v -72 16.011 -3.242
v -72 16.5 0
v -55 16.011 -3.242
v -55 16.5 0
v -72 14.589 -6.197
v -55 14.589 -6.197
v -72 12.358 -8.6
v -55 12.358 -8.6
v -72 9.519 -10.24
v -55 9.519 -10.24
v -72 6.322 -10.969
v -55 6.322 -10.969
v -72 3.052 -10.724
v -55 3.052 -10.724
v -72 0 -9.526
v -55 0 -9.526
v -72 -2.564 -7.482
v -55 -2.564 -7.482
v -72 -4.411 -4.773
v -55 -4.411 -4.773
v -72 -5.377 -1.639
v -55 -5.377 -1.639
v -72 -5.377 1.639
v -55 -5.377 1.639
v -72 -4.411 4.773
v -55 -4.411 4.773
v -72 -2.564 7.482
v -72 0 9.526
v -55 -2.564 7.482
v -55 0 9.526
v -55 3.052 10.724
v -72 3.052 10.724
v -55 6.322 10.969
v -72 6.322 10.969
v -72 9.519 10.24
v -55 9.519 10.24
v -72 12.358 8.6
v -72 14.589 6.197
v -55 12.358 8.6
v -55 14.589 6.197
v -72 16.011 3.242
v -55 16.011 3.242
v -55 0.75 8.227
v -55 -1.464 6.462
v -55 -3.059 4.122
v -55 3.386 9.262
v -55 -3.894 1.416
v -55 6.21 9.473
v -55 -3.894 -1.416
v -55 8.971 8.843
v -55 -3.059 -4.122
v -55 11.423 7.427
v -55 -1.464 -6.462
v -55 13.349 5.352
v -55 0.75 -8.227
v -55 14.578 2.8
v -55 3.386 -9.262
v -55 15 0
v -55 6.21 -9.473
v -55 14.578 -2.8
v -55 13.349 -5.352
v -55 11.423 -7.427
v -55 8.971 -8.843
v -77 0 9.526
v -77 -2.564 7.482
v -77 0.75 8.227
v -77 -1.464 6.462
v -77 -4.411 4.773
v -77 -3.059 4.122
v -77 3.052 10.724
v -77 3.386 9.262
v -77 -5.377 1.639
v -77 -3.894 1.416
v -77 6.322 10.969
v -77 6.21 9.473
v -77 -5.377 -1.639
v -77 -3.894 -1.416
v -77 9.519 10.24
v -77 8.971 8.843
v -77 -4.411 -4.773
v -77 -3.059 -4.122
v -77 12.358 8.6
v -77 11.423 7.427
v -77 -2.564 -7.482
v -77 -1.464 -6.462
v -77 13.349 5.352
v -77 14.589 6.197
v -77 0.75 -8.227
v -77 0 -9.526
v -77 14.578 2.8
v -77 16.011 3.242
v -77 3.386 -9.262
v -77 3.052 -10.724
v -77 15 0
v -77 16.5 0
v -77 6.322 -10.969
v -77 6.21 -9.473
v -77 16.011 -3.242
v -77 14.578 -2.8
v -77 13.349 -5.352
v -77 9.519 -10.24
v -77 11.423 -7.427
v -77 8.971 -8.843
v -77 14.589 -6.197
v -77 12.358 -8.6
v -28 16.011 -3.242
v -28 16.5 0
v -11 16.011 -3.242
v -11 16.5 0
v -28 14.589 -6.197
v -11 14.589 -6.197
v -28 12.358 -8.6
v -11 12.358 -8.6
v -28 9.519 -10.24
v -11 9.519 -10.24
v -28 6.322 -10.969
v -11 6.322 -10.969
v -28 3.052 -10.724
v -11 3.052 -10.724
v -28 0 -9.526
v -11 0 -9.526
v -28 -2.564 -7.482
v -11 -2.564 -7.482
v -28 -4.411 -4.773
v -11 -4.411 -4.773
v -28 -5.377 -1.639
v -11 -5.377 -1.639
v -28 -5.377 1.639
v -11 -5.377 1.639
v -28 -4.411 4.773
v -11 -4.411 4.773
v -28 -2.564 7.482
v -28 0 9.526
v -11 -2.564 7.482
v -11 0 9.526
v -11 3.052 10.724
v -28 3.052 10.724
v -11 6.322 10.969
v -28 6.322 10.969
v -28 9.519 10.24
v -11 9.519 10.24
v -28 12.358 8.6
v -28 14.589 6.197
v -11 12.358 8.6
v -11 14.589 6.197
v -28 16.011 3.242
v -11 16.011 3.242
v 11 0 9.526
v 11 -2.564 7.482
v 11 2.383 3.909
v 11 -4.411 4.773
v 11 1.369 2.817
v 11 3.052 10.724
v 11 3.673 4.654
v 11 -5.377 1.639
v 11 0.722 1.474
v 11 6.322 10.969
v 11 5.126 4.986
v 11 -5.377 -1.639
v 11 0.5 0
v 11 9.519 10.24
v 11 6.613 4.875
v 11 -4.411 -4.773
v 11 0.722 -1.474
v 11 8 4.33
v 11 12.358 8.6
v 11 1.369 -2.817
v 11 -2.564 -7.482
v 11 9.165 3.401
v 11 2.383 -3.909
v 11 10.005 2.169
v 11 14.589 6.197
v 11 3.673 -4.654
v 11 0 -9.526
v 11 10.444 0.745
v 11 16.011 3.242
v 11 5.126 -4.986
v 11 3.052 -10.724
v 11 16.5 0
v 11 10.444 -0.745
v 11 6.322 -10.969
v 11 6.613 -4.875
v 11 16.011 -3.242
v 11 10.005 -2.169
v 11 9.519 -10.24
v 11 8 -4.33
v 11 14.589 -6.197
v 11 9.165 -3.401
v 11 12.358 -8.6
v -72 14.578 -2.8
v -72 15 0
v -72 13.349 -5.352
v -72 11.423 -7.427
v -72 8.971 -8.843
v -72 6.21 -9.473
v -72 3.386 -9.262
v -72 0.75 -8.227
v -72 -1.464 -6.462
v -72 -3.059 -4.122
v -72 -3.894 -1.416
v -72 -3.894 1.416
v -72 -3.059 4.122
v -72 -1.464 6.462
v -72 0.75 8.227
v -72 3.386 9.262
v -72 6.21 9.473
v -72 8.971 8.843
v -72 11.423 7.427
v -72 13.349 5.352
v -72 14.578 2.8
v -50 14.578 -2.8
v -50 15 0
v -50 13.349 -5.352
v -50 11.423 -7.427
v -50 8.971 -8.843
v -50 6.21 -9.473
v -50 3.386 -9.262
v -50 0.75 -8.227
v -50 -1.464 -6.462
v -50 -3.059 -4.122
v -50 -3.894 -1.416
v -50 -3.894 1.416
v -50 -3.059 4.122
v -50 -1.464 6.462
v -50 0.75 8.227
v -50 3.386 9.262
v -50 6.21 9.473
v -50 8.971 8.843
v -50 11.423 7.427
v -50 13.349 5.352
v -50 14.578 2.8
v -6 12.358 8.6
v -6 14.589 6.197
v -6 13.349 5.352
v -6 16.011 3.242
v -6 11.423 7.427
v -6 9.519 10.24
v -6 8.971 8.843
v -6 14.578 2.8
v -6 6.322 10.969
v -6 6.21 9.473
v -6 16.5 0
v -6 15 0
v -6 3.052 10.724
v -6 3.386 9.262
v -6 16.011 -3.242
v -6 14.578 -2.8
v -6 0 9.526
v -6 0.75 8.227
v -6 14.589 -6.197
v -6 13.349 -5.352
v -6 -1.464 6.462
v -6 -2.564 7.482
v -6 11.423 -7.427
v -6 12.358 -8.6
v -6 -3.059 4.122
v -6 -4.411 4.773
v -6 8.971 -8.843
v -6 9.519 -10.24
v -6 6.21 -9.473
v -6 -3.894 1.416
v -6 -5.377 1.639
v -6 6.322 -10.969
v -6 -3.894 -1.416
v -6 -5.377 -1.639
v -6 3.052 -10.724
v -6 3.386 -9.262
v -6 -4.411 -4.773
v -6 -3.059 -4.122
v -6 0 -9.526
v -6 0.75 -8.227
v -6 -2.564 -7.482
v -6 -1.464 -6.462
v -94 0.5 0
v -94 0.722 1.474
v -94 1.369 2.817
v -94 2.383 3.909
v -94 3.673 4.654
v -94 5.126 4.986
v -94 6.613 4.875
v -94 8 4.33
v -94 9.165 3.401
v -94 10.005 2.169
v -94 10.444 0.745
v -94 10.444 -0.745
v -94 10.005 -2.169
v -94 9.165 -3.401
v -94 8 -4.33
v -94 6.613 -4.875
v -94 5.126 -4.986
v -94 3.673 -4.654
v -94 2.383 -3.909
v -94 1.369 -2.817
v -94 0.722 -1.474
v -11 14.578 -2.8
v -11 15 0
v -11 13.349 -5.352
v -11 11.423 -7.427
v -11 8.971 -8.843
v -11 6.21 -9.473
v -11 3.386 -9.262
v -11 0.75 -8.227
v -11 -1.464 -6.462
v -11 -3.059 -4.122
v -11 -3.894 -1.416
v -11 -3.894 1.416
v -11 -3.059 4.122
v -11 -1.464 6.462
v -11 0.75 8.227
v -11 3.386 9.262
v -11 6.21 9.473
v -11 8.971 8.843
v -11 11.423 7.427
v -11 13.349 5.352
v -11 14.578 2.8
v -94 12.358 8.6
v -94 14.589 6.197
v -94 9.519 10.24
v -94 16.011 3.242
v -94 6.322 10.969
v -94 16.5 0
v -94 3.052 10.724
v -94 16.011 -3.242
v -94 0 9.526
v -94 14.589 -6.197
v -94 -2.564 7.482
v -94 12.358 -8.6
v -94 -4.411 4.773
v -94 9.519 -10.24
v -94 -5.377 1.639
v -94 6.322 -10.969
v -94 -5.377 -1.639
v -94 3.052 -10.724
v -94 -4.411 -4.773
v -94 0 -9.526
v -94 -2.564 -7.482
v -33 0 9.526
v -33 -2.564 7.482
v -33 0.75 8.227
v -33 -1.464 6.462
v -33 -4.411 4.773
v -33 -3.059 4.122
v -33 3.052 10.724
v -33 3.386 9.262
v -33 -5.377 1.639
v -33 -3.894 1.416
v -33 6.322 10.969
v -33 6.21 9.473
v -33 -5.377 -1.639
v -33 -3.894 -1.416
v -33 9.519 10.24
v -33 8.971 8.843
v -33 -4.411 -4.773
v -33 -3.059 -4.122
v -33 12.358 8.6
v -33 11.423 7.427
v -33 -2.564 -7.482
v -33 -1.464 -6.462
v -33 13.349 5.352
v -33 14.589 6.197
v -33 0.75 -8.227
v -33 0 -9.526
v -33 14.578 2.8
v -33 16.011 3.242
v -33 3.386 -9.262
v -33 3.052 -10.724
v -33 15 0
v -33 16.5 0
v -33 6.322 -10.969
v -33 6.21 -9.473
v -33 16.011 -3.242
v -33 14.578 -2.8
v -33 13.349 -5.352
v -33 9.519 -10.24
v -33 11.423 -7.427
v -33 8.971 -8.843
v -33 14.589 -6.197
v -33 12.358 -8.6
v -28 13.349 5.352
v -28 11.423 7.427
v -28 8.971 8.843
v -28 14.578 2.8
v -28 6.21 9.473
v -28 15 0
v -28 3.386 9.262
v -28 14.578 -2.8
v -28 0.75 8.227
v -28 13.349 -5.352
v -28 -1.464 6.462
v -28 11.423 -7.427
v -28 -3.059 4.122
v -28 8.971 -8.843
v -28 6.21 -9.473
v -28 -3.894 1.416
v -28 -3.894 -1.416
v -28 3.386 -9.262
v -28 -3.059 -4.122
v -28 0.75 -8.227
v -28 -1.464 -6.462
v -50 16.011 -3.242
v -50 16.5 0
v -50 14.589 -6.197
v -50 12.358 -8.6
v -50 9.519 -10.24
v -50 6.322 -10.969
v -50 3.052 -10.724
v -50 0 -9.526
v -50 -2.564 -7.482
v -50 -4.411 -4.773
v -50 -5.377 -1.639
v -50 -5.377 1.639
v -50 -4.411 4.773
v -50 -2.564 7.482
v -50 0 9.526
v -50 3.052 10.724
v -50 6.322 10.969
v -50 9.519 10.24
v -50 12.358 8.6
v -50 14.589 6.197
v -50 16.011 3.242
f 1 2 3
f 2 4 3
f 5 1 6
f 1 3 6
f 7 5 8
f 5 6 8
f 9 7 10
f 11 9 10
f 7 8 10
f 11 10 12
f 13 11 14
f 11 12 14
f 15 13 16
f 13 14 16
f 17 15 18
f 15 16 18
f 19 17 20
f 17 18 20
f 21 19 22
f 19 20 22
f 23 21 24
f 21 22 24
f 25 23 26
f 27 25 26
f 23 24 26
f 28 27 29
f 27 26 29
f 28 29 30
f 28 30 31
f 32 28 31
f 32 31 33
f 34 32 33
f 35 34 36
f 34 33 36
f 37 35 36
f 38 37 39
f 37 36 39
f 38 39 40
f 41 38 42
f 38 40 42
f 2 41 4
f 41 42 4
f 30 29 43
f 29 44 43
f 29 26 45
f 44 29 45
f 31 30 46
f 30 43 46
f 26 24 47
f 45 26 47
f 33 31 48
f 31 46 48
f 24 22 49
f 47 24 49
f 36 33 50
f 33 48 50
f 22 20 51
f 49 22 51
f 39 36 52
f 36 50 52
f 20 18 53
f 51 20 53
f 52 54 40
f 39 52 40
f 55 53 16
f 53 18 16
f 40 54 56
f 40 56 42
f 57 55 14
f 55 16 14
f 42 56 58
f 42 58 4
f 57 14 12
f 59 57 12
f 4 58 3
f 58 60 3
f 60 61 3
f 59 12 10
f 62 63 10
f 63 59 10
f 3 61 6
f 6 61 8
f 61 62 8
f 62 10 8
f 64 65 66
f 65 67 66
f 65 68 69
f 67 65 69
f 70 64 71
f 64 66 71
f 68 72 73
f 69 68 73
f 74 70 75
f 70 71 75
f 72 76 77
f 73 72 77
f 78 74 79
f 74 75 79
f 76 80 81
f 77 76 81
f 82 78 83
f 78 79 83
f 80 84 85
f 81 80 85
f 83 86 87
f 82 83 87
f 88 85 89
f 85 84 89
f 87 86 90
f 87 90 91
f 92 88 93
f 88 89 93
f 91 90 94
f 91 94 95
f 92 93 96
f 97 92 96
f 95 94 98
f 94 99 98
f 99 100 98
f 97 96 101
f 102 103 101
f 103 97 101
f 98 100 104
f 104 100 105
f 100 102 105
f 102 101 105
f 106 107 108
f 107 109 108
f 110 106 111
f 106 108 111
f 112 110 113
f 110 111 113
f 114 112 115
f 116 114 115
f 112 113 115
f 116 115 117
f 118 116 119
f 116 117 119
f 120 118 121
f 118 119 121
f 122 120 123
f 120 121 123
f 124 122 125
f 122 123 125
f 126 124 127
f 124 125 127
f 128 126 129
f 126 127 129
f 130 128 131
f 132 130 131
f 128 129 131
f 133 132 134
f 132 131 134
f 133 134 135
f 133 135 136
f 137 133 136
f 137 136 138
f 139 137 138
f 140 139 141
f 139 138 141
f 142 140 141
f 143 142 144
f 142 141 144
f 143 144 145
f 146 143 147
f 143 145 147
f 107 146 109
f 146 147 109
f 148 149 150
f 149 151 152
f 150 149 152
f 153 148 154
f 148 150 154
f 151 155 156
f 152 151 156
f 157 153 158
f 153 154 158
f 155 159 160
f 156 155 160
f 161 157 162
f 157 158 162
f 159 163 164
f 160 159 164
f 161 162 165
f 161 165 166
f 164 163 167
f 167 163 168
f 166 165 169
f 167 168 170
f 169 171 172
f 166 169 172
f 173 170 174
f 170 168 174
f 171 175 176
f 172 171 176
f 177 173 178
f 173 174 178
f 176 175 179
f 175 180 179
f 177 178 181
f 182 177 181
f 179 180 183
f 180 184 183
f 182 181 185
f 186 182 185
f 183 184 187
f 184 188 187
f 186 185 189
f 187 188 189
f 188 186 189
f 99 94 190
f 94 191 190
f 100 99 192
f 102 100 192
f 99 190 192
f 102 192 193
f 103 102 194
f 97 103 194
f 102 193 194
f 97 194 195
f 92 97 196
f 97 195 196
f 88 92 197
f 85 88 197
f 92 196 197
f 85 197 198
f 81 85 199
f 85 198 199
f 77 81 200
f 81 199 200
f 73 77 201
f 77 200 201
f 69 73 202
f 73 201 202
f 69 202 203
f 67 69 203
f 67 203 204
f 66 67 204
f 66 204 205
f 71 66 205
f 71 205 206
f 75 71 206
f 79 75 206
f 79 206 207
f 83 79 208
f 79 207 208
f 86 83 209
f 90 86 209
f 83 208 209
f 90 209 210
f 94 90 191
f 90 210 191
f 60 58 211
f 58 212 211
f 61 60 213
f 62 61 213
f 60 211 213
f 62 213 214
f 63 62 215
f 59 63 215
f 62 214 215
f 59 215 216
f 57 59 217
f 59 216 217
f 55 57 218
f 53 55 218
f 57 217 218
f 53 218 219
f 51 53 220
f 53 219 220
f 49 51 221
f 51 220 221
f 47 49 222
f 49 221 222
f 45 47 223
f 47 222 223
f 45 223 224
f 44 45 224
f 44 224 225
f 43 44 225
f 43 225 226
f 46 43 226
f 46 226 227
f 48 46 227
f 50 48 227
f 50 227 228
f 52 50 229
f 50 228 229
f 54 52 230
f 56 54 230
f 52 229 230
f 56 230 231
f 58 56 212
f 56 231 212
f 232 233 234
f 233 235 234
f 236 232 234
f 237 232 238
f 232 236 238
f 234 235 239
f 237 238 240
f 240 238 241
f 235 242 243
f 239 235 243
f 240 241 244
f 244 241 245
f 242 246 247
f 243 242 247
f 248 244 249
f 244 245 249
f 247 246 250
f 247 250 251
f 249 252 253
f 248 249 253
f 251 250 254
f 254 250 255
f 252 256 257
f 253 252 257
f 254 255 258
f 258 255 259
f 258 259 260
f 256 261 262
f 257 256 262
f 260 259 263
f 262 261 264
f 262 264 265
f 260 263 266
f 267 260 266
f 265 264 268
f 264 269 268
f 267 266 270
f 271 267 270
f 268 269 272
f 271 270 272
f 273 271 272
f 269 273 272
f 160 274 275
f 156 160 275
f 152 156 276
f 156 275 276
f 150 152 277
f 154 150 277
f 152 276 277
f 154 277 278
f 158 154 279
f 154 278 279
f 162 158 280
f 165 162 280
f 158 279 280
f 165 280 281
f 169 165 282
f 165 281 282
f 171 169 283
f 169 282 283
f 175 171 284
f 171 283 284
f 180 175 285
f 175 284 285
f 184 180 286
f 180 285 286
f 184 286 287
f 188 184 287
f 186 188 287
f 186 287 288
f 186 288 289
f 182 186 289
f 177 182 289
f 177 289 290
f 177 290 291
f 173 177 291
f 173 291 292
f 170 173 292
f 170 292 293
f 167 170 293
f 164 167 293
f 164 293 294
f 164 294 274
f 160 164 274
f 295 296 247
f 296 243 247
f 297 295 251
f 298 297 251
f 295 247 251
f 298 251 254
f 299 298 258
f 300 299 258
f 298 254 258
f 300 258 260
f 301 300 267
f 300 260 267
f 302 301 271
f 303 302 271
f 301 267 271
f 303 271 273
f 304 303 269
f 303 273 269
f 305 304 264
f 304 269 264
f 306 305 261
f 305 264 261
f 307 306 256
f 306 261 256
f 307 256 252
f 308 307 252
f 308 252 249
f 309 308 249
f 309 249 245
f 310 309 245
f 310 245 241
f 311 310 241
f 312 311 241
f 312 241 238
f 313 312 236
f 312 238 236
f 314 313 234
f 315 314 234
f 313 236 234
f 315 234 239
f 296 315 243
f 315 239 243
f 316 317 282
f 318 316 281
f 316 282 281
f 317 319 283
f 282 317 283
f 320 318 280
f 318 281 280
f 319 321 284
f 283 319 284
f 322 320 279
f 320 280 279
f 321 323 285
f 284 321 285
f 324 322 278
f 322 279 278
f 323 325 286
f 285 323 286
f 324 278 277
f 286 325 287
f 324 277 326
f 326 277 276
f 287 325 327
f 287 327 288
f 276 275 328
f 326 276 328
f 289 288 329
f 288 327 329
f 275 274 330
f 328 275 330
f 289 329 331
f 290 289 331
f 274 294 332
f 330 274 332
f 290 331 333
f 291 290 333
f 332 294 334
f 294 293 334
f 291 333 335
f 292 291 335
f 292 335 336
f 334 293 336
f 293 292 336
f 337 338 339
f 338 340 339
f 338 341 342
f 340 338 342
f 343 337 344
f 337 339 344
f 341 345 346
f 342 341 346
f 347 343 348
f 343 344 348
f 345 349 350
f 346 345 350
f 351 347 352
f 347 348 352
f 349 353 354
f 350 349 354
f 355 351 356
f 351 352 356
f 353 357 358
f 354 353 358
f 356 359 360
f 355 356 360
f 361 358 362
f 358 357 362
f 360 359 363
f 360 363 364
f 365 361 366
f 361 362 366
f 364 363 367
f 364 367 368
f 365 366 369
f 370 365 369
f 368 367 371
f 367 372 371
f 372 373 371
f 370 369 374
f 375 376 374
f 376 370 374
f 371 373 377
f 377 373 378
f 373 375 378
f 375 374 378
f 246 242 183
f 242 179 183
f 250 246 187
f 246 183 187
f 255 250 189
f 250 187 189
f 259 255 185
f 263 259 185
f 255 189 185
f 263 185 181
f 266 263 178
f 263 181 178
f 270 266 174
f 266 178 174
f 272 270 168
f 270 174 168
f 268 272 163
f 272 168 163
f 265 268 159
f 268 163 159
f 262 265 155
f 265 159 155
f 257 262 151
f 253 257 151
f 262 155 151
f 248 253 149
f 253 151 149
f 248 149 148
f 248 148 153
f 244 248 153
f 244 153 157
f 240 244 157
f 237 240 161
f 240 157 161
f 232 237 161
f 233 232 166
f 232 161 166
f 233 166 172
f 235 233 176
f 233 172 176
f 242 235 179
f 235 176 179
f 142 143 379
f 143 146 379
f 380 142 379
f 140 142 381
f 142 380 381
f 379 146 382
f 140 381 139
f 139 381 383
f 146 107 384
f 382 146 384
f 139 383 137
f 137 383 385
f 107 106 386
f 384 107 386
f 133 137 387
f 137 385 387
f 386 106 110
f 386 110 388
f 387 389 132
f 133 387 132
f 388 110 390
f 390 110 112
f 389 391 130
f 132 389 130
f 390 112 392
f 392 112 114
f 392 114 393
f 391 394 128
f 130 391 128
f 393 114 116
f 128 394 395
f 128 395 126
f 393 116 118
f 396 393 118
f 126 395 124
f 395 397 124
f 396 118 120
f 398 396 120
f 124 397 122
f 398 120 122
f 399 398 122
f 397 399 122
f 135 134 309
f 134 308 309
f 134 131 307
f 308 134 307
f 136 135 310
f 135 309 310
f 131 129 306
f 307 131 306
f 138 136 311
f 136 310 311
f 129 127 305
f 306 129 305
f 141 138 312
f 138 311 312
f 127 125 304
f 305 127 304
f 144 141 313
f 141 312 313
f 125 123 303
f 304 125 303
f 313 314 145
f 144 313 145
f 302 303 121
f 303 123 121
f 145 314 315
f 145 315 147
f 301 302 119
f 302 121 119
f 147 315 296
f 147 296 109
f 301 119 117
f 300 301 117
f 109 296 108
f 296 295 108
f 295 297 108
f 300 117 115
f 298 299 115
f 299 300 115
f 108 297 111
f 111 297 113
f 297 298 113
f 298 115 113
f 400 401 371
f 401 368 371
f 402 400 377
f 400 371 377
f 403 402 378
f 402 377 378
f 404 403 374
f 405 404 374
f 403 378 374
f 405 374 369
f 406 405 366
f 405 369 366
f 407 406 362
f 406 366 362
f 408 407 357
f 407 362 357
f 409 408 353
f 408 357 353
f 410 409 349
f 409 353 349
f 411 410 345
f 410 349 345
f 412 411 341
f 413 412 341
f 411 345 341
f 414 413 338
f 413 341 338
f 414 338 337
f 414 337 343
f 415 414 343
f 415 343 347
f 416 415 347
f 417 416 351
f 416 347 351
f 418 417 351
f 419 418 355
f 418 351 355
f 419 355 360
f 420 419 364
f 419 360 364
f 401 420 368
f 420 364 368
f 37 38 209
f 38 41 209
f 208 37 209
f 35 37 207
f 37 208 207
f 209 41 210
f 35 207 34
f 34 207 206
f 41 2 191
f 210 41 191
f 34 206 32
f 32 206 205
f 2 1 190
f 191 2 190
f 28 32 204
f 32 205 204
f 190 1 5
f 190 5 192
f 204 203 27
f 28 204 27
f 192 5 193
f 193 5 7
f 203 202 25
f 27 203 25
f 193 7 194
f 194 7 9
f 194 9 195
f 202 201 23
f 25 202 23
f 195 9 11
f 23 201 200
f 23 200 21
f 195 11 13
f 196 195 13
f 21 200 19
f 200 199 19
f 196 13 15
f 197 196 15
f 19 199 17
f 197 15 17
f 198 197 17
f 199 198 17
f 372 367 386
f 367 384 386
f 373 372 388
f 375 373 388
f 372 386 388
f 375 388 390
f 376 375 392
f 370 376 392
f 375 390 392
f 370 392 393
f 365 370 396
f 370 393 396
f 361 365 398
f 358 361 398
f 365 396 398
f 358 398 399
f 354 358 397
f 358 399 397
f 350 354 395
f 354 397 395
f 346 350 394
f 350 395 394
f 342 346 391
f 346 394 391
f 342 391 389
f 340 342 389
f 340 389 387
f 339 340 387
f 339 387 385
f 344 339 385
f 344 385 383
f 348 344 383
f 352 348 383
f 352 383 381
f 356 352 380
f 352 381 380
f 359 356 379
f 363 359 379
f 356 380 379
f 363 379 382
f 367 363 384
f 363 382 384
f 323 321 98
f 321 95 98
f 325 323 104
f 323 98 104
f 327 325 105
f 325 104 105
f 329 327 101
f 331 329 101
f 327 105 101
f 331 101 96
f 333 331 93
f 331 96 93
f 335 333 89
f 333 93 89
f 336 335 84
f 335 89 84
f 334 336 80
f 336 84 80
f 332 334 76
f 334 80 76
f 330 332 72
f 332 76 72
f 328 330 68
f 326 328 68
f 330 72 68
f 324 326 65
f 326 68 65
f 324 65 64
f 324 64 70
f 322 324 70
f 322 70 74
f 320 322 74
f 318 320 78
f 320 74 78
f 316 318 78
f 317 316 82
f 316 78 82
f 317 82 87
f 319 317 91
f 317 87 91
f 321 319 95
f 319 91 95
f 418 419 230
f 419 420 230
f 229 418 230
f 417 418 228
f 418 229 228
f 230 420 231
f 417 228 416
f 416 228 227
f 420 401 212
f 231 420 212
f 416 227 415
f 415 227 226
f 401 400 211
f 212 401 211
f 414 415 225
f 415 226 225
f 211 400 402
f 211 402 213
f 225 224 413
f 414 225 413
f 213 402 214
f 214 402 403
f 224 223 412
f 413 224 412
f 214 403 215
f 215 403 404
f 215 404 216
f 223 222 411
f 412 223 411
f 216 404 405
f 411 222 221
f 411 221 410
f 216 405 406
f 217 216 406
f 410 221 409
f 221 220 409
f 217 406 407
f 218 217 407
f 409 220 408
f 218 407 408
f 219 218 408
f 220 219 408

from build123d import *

# Parameters (mm, degrees)
SKETCH3_R          = 5
CUT_EXTRUDE2_DEPTH = 107.856211799


with BuildPart() as part:
    # Sketch1 → Revolve2 (revolve)
    with BuildSketch(Plane.XY, mode=Mode.PRIVATE) as revolve2_sk:
        Polygon((-6, -5.5), (11, -5.5), (11, 5.5), (-6, 5.5), (-11, 5.5), (-33, 5.5), (-55, 5.5), (-77, 5.5), (-94, 5.5), (-94, -5.5), (-77, -5.5), (-77, -4), (-72, -4), (-72, -5.5), (-55, -5.5), (-55, -4), (-50, -4), (-50, -5.5), (-33, -5.5), (-33, -4), (-28, -4), (-28, -5.5), (-11, -5.5), (-11, -4), (-6, -4), align=None)
    revolve(revolve2_sk.sketch.rotate(Axis((-33, 5.5, 0), (-1, 0, 0)), 180), axis=Axis((-33, 5.5, 0), (-1, 0, 0)))

    # Sketch3 → Cut-Extrude2 (cut, through all)
    with BuildSketch(Plane.ZY.offset(94)):
        with Locations(Location((0, 5.5, 0), (0, 0, 270))):
            Circle(SKETCH3_R)
    extrude(amount=-CUT_EXTRUDE2_DEPTH, mode=Mode.SUBTRACT)


solid = part.part
